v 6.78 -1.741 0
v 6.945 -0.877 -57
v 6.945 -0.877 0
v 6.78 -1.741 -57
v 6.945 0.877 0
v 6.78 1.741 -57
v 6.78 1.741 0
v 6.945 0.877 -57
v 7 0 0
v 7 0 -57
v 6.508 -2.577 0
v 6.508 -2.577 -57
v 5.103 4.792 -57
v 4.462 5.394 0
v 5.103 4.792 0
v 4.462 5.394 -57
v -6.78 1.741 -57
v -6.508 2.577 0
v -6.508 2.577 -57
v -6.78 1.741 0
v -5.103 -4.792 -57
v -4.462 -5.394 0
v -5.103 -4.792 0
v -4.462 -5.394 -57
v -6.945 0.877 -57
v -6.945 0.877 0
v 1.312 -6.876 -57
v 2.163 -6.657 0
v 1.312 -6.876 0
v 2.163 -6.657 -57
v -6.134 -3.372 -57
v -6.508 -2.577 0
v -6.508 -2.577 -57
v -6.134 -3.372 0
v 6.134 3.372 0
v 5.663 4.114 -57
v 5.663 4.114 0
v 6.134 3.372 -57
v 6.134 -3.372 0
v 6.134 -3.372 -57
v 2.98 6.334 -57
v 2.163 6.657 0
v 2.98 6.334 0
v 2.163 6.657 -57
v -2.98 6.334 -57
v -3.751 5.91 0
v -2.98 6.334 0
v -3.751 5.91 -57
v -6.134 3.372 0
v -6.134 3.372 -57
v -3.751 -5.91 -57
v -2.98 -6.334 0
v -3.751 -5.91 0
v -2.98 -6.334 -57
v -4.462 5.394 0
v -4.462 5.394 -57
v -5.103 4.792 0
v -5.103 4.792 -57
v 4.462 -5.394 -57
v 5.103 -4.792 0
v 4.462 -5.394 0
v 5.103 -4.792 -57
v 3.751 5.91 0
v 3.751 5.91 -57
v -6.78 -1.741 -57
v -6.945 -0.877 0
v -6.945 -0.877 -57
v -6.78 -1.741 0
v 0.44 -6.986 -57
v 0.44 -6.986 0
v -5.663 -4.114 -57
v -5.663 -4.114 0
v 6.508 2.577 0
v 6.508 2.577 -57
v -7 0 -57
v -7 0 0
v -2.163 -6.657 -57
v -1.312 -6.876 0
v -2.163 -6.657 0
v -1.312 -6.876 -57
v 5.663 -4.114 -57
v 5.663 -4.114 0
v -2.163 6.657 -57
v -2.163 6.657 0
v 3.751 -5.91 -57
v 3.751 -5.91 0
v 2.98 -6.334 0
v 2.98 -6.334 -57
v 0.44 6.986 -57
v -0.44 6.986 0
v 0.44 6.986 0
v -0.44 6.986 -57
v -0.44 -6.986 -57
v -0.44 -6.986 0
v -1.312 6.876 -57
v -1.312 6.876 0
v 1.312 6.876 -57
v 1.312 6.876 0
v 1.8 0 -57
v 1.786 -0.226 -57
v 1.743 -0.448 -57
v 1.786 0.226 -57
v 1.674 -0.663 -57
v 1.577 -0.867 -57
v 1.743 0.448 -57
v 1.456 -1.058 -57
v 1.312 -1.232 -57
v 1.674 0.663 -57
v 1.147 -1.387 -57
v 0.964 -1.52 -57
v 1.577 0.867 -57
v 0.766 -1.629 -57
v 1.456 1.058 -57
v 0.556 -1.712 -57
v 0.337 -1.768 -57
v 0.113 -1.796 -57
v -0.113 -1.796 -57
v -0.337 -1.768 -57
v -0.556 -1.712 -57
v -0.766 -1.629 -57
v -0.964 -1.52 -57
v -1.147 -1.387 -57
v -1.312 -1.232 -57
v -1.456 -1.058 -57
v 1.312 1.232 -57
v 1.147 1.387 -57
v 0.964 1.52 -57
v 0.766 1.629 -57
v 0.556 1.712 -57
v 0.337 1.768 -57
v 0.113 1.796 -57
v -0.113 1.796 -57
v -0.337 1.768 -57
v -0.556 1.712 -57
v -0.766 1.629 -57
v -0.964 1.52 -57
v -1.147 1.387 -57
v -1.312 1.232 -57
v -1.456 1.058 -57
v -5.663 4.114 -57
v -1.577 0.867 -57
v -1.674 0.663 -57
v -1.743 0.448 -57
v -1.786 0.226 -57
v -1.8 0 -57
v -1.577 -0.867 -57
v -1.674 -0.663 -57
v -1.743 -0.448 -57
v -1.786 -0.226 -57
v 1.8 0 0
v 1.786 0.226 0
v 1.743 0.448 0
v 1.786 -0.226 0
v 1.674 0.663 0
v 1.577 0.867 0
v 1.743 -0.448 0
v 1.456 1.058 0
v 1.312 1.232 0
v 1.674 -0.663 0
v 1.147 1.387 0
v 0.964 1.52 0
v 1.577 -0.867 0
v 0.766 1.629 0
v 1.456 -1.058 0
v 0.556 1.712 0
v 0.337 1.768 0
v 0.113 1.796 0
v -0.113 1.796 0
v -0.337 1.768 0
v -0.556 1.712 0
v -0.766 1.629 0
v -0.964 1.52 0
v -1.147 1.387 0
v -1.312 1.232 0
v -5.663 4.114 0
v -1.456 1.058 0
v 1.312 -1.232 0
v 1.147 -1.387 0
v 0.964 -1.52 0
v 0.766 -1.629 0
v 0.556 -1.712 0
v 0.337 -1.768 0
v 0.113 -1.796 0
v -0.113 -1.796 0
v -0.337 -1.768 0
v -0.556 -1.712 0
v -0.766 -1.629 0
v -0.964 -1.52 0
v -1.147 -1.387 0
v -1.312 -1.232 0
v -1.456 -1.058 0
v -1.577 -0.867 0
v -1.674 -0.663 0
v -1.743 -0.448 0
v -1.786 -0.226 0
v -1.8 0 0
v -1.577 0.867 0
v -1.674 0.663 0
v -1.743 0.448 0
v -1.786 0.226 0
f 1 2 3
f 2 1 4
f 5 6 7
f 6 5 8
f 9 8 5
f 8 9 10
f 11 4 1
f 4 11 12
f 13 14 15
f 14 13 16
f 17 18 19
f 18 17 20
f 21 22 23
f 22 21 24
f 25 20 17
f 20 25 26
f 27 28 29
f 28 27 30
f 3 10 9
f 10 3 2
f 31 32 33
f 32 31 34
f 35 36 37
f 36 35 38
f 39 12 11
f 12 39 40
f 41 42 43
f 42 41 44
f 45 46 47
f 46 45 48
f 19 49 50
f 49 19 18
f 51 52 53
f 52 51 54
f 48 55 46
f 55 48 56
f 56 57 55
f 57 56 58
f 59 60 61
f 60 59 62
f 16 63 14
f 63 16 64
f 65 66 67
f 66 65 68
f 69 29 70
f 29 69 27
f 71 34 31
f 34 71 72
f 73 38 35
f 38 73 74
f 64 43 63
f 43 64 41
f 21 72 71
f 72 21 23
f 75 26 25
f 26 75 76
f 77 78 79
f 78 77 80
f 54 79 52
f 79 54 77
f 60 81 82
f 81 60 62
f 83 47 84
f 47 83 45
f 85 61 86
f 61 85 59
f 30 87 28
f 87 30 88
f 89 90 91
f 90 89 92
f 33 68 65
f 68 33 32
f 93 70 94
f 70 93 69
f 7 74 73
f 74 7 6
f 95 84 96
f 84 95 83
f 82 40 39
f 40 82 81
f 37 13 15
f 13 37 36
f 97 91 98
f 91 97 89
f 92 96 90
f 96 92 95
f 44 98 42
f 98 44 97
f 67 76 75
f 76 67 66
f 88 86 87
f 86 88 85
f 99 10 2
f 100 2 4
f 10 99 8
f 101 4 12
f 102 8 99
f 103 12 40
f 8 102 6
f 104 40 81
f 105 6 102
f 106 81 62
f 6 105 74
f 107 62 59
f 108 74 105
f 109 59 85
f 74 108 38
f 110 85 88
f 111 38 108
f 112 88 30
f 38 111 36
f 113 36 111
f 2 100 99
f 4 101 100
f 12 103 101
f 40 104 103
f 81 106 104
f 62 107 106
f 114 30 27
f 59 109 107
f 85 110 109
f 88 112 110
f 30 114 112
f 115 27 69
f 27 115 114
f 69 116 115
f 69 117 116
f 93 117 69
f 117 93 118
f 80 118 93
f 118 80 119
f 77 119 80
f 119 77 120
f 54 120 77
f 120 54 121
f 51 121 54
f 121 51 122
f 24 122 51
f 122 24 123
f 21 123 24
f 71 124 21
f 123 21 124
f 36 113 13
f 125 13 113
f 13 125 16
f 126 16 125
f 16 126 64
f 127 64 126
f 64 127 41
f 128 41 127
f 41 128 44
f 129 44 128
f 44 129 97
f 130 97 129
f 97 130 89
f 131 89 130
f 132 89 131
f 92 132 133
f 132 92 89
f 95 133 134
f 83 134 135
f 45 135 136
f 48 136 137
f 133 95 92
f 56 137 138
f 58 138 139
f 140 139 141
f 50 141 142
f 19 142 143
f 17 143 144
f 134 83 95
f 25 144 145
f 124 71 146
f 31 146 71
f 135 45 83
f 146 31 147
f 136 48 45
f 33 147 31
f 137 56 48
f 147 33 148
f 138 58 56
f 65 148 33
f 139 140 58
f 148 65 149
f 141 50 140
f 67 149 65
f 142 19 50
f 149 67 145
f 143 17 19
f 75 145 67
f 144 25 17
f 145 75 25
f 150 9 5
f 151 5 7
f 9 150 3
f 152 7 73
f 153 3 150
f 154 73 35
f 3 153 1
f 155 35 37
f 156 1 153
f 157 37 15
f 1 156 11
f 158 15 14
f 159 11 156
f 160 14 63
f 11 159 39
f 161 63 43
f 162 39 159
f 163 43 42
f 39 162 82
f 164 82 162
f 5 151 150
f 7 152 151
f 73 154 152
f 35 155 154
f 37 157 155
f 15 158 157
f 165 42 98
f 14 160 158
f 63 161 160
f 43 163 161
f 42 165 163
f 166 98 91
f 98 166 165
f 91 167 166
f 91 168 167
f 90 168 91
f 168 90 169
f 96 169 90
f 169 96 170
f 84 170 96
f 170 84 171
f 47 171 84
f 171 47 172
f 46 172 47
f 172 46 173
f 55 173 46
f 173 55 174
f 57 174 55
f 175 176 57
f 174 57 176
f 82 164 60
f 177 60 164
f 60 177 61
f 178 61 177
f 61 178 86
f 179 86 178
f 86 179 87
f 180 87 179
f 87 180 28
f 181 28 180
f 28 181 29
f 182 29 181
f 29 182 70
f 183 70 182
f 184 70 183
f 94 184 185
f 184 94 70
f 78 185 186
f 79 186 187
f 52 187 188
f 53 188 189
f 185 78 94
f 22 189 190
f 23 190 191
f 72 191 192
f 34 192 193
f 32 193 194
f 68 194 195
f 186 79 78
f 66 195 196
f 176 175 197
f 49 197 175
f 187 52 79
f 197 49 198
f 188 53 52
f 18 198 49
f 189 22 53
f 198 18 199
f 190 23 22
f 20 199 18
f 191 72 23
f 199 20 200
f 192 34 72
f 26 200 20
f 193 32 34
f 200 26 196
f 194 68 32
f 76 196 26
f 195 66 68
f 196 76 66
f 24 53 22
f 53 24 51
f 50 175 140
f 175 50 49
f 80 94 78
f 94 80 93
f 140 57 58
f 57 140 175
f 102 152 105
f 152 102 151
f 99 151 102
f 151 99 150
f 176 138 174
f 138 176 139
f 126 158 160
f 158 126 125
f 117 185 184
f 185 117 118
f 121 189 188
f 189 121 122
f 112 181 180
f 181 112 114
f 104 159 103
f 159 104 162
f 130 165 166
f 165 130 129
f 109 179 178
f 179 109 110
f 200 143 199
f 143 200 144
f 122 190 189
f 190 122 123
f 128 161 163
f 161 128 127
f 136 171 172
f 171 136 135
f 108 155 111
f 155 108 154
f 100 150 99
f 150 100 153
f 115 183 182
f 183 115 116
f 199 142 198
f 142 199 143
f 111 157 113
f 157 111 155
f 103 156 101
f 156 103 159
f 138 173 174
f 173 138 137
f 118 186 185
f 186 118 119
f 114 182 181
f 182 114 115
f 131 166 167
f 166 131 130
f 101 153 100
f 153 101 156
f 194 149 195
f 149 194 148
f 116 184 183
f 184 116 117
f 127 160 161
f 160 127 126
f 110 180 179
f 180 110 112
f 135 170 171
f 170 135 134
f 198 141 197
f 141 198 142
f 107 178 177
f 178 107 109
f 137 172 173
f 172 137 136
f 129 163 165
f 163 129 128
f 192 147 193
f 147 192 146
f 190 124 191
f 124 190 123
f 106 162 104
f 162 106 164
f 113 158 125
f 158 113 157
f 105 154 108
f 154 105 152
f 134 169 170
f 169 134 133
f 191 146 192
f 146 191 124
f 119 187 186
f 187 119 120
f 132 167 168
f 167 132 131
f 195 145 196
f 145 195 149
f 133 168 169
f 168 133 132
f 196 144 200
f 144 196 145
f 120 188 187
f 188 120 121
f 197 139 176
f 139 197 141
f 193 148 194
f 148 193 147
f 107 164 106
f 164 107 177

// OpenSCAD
$fn = 50;


difference() {
	union() {
		translate(v = [0, 0, -57.0000000000]) {
			cylinder(h = 57, r = 7.0000000000);
		}
		cylinder(h = 0, r = 16.0000000000);
	}
	union() {
		#translate(v = [0, 0, -57]) {
			cylinder(h = 57, r = 1.8000000000);
		}
	}
}
